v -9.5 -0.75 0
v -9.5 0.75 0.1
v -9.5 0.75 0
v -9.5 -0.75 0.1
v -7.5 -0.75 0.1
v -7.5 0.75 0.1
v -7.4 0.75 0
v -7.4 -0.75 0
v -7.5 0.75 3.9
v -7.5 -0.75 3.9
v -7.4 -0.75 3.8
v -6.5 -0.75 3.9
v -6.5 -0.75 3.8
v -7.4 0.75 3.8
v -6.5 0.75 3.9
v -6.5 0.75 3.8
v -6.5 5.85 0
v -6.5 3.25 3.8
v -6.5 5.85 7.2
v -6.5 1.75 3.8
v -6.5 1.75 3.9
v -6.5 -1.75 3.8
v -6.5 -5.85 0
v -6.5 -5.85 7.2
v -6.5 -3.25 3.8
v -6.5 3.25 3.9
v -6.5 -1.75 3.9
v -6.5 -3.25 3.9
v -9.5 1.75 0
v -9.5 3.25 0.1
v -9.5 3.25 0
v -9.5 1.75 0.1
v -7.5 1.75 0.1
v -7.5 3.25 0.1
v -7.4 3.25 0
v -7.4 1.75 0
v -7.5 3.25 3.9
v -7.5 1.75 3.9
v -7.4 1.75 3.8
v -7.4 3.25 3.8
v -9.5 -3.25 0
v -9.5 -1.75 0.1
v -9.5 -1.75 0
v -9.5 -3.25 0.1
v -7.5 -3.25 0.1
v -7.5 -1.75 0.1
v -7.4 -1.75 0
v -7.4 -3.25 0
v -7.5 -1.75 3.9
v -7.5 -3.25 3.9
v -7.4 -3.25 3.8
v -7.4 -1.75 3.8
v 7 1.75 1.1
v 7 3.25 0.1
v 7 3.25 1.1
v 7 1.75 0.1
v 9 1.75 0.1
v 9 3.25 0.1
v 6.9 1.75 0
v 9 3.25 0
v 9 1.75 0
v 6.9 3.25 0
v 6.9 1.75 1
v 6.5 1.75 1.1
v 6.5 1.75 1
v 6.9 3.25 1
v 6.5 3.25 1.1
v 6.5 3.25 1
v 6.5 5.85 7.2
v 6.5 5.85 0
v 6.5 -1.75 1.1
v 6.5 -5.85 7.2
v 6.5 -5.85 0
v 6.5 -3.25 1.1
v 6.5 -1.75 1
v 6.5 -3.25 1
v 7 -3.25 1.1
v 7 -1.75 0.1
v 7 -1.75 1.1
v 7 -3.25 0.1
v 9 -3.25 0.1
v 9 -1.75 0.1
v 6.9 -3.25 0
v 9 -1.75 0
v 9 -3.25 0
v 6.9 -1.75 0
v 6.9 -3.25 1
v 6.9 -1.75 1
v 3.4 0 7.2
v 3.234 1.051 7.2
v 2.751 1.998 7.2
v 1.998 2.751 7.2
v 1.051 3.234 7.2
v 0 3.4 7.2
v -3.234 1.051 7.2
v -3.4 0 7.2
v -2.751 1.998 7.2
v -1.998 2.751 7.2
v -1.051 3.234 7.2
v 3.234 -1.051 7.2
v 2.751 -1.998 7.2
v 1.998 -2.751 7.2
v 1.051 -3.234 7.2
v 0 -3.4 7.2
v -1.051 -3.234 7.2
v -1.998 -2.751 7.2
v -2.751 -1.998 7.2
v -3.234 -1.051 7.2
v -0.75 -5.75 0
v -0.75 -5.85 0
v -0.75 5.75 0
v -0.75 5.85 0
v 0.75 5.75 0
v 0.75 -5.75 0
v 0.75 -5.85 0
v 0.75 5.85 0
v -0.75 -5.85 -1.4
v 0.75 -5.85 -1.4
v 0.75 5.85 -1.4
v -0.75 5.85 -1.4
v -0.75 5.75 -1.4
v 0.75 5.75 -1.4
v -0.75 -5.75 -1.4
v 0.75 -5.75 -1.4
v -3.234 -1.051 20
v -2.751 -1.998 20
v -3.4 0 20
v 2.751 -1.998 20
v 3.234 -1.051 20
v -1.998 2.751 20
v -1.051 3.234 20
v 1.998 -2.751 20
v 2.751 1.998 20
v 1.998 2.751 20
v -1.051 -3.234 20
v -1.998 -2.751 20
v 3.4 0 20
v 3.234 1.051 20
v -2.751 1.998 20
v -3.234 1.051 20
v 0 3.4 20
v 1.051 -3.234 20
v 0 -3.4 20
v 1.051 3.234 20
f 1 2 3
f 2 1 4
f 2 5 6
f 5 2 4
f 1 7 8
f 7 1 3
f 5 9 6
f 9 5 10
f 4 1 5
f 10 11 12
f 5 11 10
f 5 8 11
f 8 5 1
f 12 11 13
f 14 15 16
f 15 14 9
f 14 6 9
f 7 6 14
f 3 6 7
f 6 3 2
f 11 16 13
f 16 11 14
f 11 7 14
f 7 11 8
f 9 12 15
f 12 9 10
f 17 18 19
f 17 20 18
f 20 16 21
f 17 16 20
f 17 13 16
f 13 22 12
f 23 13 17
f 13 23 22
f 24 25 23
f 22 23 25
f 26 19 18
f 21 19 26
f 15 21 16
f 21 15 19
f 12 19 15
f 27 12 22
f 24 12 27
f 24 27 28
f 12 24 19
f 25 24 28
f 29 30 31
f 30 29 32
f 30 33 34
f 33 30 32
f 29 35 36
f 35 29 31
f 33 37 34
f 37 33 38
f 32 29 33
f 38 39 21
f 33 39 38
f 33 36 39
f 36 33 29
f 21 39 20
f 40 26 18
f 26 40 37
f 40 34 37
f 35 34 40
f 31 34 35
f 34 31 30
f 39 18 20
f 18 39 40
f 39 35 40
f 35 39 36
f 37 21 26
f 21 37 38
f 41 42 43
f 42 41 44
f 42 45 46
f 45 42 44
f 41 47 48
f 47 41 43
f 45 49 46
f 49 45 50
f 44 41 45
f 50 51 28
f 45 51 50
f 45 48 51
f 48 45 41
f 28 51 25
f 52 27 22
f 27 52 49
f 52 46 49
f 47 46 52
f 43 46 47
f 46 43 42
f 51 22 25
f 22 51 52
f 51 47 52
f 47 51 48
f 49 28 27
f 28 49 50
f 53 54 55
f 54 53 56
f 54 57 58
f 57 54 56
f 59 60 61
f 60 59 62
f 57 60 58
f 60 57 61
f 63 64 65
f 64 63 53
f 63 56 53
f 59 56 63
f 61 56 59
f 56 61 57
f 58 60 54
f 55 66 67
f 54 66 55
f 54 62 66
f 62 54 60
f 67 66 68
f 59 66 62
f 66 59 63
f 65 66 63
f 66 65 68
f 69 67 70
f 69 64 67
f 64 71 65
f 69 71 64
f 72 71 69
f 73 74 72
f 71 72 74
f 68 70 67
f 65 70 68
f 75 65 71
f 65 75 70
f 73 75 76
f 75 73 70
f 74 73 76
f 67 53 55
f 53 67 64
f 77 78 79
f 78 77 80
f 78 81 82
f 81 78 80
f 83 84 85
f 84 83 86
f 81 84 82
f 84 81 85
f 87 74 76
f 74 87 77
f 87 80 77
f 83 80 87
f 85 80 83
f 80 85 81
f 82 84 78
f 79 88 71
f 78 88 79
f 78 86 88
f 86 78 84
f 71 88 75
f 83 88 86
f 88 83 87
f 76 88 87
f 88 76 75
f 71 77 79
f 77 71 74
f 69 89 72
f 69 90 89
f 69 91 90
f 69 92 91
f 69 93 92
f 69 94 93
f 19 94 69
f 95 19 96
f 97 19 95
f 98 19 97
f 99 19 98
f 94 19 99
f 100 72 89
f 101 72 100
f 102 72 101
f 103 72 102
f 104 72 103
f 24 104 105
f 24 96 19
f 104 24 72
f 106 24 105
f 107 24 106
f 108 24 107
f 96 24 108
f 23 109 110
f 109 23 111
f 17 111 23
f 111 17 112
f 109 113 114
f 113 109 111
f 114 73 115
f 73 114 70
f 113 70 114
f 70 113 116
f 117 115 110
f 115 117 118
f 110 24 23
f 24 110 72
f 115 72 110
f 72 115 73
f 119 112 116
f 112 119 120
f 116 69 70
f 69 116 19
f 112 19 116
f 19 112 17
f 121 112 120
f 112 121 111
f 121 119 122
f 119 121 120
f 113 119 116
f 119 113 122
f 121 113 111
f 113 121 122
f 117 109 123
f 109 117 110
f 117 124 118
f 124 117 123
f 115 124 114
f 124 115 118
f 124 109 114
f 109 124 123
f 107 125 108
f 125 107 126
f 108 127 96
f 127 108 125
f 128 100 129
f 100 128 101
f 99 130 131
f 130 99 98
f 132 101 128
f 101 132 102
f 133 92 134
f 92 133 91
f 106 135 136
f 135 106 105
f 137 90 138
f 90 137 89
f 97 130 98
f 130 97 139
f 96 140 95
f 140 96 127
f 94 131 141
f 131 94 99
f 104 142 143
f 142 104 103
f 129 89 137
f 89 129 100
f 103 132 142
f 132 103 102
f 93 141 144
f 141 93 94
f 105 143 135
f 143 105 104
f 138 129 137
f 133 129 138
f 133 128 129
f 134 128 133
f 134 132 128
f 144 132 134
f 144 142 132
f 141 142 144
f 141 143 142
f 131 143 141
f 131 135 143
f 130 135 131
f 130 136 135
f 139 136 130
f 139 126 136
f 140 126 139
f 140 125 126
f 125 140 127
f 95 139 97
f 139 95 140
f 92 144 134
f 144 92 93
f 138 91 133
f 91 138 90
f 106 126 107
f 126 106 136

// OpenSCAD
shaftL=20;
bodyL=13;
bodyW=11.7;
bodyH=7.2;

module body() {
rotate([0,0,180]){
    // body
    translate([-bodyL/2,-bodyW/2])color("grey")cube([bodyL,bodyW,bodyH]);
    // body mounting tabs
    translate([-1.5/2,-bodyW/2,-1.4])cube([1.5,0.1,1.4]);
    translate([-1.5/2,-0.1+bodyW/2,-1.4])cube([1.5,0.1,1.4]);
    
    // shaft
    translate([0,0,bodyH])color("silver")cylinder(r=6.8/2, h=shaftL-bodyH, $fn=20);

    // pins
    translate([6.5,0,0])frontPin();
    translate([6.5,-2.5,0])frontPin();
    translate([6.5,+2.5,0])frontPin();
    
    translate([-6.5,-2.5,0])backPin();
    translate([-6.5,+2.5,0])backPin();
}
}

module frontPin() {
    translate([1,-0.75,0])cube([2,1.5,0.1]);
    translate([1-0.1,-0.75,0])cube([0.1,1.5,3.8]);
    translate([0,-0.75,3.8])cube([1,1.5,0.1]);
}

module backPin() {
    translate([-2.5,-0.75,0])cube([2,1.5,0.1]);
    translate([-0.5,-0.75,0])cube([0.1,1.5,1]);
    translate([-0.5,-0.75,1])cube([0.5,1.5,0.1]);
}

body();
